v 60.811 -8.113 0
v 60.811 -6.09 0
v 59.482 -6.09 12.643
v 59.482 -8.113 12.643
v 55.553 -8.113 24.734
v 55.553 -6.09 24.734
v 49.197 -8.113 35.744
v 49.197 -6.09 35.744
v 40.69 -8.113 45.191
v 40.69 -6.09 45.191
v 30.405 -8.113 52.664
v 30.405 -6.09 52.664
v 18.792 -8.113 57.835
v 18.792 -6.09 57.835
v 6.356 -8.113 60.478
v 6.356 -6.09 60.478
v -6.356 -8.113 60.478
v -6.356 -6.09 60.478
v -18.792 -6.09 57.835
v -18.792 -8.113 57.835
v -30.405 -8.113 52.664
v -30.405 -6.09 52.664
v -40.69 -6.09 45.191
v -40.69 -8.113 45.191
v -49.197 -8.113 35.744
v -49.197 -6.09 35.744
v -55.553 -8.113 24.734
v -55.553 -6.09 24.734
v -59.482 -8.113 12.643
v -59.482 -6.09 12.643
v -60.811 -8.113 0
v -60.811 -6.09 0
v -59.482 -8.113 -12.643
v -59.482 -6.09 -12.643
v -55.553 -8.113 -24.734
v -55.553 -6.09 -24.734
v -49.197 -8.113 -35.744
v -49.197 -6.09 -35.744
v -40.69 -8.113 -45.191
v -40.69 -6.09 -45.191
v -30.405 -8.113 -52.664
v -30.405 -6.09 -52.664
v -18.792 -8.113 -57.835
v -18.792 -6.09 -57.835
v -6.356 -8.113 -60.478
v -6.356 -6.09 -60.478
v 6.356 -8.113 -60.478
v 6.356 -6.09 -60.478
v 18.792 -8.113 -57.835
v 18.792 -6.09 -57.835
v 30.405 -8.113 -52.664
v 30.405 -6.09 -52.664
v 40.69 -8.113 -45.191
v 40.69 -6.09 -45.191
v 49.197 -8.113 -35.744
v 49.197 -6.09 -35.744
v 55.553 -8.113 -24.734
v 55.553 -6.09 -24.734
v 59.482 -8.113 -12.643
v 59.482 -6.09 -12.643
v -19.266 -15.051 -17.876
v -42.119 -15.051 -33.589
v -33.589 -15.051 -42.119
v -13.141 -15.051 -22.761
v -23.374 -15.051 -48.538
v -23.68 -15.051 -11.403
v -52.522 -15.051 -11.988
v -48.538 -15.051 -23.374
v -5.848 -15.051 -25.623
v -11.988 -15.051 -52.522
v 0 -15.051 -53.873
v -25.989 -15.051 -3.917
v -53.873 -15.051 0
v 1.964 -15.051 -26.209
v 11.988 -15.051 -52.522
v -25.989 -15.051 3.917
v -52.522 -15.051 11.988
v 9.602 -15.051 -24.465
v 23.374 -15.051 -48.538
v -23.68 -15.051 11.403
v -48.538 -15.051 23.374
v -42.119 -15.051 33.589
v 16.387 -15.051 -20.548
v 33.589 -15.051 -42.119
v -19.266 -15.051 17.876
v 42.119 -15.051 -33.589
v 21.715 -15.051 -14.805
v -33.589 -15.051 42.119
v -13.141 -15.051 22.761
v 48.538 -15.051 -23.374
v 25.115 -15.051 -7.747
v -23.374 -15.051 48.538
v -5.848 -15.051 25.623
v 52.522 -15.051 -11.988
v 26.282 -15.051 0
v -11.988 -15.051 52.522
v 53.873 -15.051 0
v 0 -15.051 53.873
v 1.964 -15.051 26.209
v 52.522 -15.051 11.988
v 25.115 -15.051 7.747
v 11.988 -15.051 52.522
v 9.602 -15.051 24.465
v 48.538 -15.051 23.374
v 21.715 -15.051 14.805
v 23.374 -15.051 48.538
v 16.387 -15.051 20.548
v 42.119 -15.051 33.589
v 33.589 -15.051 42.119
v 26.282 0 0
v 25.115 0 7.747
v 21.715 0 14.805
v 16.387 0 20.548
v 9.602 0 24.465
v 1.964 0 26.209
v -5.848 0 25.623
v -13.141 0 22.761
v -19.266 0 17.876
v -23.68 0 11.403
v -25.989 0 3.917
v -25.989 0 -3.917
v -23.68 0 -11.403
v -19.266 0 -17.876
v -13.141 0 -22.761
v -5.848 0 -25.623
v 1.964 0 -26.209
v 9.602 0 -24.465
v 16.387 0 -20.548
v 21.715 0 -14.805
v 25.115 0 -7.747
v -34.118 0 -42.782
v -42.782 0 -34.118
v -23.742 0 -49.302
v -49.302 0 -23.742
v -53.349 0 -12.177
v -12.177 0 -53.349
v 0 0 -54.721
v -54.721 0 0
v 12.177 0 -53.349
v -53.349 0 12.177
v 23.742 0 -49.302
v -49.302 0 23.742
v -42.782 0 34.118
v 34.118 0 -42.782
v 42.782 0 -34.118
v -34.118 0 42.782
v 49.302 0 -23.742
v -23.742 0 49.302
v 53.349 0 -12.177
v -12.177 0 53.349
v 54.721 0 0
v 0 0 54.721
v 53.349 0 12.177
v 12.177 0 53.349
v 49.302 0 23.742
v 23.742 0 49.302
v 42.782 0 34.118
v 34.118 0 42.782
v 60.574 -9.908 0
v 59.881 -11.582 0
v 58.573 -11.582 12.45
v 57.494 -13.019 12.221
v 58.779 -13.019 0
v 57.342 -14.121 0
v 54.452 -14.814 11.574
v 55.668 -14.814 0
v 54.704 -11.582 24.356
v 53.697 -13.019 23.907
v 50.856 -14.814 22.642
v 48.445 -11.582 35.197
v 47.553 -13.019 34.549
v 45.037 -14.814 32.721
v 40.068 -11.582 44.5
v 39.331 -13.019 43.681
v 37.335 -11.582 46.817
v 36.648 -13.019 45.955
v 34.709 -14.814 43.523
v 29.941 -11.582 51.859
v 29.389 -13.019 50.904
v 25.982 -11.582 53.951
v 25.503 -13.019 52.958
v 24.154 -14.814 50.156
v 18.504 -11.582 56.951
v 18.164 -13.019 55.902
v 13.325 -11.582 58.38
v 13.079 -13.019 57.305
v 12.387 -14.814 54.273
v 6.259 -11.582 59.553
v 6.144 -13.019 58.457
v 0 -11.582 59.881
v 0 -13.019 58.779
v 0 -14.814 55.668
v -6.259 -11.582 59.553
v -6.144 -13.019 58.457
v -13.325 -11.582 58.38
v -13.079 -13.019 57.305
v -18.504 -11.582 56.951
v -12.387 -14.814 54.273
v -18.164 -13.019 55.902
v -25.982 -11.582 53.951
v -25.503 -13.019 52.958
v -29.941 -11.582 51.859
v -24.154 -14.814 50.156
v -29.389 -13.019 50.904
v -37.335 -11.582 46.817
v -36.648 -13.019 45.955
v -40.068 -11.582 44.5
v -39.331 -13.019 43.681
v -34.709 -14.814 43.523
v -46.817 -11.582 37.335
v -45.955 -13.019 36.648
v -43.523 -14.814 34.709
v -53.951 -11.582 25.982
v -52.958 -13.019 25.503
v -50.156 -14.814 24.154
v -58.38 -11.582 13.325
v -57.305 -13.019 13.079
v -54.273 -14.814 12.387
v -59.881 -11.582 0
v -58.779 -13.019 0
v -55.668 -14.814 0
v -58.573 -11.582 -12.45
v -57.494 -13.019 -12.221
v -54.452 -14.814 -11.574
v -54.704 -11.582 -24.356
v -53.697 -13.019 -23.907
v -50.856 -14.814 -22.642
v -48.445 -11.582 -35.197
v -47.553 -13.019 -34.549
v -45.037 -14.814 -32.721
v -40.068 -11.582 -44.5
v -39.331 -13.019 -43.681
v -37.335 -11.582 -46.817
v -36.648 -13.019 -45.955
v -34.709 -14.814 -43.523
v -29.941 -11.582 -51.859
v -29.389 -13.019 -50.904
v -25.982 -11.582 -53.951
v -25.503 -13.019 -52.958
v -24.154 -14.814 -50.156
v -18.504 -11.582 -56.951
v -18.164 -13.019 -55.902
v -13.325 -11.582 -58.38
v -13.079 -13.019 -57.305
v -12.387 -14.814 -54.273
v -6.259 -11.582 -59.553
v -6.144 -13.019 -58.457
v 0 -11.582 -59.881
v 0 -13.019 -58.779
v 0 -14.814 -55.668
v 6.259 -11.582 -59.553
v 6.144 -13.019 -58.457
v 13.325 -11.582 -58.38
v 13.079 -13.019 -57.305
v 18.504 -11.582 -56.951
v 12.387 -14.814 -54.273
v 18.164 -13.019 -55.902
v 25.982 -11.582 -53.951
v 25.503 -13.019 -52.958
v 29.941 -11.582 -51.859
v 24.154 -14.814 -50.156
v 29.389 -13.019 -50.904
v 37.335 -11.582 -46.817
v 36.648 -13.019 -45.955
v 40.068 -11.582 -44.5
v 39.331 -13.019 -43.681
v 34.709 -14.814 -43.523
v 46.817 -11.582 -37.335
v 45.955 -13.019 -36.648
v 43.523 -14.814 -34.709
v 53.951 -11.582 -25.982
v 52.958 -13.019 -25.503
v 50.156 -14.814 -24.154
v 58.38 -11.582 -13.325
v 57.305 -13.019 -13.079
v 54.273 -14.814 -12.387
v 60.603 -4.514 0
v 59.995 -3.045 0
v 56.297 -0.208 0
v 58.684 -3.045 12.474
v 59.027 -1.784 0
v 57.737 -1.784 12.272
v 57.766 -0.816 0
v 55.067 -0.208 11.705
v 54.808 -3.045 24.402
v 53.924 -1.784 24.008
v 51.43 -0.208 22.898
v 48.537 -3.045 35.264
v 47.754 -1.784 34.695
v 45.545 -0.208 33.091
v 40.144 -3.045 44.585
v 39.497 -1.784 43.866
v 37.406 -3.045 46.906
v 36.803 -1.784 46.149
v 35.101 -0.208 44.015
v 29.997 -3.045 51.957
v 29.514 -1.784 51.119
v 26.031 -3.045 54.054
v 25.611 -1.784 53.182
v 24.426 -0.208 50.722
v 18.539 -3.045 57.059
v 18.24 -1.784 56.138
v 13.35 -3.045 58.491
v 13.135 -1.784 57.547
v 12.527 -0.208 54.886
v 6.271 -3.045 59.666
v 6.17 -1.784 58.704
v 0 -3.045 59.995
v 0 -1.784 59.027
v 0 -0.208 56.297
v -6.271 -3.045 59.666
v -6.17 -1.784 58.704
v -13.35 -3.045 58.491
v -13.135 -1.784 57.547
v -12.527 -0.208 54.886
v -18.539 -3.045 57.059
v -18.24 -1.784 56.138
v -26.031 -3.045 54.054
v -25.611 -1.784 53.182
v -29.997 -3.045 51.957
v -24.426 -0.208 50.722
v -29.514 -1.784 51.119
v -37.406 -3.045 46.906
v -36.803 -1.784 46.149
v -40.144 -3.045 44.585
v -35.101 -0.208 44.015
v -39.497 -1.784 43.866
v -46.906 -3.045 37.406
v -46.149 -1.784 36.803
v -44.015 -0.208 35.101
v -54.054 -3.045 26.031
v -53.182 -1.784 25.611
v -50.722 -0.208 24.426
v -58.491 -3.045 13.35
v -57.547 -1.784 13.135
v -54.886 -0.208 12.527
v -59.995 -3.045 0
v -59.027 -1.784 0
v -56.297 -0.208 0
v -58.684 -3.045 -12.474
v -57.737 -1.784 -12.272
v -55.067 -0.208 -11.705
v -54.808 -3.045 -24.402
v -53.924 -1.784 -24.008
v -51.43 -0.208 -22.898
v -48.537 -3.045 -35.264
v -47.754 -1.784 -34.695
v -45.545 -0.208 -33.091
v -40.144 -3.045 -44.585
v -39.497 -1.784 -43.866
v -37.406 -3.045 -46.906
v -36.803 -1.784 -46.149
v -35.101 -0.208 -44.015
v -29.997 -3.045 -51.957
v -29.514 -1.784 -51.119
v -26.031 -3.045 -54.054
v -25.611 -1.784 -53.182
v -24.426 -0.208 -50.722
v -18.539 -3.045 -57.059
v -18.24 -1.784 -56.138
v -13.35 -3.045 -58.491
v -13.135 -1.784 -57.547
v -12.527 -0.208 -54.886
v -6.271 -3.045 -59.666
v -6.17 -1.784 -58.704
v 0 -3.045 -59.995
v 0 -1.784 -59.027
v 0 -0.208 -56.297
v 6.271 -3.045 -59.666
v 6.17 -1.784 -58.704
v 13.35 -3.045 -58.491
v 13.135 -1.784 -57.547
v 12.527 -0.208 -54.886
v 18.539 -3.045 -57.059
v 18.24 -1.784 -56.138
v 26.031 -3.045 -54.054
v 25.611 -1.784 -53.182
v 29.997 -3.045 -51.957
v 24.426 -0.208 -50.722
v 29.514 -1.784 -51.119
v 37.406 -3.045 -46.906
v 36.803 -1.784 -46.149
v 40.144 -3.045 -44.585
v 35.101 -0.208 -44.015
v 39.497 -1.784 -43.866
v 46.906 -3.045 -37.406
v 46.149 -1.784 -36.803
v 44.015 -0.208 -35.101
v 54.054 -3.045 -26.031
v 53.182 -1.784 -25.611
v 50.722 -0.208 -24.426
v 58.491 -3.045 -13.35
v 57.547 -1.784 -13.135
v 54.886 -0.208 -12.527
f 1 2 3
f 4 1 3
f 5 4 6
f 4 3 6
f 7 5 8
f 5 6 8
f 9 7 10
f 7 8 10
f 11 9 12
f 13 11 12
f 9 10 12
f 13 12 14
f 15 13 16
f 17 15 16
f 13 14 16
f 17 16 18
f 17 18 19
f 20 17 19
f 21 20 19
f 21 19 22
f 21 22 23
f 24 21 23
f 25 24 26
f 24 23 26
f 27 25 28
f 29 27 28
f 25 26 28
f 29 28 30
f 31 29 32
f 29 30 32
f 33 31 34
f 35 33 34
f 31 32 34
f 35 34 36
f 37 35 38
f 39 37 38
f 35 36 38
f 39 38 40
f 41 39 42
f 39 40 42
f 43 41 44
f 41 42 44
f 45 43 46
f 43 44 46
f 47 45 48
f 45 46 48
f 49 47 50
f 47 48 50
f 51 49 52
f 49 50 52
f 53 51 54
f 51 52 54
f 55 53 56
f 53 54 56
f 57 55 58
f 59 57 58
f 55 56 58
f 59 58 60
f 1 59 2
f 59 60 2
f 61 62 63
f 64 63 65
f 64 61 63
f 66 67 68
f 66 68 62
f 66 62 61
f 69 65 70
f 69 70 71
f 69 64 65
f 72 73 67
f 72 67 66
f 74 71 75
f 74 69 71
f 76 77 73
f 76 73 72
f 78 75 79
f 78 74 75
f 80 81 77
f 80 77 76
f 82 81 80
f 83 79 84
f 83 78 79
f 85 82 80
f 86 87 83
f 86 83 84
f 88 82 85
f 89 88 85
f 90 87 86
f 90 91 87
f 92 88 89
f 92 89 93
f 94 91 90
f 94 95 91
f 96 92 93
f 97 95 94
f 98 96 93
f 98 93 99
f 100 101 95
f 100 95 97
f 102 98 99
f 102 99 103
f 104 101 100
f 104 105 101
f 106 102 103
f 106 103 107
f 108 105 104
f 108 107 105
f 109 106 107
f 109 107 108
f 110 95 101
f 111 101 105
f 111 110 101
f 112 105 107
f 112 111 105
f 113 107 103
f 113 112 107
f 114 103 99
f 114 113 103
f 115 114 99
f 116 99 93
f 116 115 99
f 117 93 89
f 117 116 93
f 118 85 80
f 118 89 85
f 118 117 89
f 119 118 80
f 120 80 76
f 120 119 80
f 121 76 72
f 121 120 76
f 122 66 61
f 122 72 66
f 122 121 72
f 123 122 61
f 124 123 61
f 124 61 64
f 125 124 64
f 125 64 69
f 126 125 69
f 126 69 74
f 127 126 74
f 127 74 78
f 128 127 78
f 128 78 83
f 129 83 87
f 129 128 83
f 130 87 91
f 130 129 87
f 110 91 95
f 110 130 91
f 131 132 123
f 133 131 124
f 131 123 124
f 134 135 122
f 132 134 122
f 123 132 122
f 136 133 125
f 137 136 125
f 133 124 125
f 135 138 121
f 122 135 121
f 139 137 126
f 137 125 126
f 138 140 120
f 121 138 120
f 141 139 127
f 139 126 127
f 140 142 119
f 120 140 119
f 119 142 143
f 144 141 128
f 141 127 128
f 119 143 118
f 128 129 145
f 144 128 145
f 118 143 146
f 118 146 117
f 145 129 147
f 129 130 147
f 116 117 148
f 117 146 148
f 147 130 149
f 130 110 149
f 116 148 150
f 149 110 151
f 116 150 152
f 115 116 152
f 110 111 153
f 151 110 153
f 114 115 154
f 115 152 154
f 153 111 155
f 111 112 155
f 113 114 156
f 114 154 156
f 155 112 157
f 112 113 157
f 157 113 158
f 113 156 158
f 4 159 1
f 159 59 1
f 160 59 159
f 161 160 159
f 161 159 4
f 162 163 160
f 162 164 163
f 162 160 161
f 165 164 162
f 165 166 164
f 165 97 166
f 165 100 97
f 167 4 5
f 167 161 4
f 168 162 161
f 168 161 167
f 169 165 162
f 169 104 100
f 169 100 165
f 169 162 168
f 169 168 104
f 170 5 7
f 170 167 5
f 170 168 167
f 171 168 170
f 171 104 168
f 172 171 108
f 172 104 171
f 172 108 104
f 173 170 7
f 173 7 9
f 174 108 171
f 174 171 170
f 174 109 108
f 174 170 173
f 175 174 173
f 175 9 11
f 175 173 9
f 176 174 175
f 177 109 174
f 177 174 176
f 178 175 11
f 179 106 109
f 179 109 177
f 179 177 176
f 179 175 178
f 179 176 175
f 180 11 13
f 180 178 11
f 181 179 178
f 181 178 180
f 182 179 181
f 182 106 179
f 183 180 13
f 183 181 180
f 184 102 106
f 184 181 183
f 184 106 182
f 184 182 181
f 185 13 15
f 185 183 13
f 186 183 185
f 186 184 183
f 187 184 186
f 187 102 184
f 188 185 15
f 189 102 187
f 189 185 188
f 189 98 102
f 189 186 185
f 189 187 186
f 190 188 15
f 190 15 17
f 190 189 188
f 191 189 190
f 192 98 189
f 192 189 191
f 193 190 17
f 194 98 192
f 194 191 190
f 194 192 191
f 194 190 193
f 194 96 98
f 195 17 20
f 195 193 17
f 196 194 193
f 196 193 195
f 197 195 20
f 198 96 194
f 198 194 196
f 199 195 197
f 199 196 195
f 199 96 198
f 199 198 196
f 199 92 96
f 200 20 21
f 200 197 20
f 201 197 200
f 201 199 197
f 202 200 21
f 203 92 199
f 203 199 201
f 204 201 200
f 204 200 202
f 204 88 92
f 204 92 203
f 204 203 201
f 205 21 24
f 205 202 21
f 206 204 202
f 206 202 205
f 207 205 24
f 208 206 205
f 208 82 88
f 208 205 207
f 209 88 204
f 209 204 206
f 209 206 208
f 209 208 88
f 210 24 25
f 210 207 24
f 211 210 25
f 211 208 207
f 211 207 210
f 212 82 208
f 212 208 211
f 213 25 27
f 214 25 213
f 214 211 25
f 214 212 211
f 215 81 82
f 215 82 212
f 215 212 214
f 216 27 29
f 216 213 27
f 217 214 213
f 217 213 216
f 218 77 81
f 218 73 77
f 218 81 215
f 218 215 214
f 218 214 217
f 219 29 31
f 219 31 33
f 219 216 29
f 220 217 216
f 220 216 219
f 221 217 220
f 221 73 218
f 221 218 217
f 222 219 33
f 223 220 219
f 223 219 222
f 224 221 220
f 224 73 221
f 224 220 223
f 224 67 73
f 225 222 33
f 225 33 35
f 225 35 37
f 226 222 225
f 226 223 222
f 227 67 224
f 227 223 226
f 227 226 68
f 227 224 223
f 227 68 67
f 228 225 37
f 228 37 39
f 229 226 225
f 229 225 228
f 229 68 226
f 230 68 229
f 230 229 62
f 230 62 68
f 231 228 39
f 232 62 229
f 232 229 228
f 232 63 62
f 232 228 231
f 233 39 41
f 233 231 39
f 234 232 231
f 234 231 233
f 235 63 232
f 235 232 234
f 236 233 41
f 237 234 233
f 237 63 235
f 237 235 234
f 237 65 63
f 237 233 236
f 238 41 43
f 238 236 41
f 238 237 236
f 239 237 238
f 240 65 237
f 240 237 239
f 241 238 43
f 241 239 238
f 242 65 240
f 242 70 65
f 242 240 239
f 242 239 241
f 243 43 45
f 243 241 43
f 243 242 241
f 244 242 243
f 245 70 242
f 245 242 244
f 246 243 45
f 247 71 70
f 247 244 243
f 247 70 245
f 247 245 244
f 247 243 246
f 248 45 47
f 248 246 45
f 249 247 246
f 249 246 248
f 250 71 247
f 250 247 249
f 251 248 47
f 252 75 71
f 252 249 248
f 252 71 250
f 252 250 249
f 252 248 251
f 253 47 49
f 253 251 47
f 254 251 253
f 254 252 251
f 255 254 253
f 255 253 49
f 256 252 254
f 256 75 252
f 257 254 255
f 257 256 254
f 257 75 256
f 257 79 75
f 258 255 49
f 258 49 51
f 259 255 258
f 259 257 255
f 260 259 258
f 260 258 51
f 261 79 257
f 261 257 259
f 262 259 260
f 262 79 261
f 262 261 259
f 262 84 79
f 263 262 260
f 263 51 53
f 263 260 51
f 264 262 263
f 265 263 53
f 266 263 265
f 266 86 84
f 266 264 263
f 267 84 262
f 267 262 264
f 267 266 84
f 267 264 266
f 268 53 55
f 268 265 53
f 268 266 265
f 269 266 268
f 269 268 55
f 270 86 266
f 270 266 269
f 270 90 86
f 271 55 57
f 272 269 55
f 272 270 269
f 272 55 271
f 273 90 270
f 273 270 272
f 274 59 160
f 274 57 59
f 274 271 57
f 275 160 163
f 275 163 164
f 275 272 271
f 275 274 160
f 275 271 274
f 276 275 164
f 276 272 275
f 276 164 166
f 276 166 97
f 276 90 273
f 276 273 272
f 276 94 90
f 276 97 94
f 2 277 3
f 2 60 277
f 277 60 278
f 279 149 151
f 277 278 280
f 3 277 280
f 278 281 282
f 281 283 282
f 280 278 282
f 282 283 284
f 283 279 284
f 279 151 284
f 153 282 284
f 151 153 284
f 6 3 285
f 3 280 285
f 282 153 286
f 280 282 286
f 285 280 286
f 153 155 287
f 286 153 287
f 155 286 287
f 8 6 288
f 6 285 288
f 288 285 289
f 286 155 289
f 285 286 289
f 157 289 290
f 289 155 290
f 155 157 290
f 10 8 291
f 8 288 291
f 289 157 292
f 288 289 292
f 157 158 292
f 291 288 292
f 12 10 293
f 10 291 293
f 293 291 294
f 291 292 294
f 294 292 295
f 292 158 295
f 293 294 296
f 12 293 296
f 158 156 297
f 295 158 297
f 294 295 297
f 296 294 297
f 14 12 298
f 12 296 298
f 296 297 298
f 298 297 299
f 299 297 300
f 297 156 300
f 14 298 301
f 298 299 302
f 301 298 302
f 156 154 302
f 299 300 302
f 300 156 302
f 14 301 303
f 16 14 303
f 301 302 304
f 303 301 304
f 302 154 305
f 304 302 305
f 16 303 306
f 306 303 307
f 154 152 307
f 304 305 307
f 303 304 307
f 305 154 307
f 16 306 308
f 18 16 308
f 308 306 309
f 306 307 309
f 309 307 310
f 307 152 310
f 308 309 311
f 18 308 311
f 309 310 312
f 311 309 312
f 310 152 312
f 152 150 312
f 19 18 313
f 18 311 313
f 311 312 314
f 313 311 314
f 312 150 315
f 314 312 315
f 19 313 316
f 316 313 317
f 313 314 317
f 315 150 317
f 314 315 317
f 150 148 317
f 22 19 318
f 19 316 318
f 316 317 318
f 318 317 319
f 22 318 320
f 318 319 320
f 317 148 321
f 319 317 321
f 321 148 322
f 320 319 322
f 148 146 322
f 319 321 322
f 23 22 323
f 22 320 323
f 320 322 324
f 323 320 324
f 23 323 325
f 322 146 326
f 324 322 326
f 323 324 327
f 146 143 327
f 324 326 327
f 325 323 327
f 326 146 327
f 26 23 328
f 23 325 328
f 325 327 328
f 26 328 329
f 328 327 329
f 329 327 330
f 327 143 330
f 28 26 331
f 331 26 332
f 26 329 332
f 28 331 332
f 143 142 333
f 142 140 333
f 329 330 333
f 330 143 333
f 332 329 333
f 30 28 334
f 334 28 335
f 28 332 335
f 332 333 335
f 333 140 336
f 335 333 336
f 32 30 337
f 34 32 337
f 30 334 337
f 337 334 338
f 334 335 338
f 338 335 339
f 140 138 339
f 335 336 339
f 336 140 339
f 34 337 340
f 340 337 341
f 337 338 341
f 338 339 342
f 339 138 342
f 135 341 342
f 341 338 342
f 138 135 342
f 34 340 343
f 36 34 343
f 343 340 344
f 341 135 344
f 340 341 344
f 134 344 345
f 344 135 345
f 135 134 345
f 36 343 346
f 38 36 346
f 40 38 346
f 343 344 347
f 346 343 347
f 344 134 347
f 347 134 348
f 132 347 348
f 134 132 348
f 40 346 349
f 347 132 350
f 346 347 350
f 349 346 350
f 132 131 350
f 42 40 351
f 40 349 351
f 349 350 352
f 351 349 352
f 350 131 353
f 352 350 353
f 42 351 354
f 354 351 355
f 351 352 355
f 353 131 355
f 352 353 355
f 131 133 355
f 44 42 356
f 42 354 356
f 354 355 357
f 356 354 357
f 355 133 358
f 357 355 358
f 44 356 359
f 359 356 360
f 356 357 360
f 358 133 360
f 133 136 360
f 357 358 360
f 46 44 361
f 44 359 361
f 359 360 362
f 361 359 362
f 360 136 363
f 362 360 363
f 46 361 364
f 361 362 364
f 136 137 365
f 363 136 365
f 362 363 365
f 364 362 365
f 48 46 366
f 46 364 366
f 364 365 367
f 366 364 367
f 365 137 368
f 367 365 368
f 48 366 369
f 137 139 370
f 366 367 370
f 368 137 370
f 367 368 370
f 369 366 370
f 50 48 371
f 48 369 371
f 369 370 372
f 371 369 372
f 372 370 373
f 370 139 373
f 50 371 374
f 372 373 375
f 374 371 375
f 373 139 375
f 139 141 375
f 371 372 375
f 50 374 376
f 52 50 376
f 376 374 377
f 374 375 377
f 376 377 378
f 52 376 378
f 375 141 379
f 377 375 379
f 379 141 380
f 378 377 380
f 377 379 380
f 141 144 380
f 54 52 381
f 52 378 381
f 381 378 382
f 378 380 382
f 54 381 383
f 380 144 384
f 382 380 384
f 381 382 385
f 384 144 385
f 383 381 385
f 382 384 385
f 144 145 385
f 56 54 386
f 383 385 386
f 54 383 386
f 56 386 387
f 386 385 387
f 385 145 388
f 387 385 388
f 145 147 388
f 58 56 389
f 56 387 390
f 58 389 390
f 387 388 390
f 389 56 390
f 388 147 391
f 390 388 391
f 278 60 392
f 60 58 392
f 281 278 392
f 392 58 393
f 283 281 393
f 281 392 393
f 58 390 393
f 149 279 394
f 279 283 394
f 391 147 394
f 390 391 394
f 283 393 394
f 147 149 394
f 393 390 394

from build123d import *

# Parameters (mm, degrees)
F1_R     = 60.8108481728
F3_DEPTH = 15.0508303195
F4_R     = 26.2822858087
F5_DEPTH = 160.9226148576
F6_R     = 6.0899953587
F7_R     = 6.9381681598


with BuildPart() as f3:
    # F1 (on face) → F3 (new body)
    with BuildSketch(Plane.XZ):
        Circle(F1_R)
    extrude(amount=F3_DEPTH)

    # F4 (on face) → F5 (cut)
    with BuildSketch(Plane.XZ):
        Circle(F4_R)
    extrude(amount=F5_DEPTH, mode=Mode.SUBTRACT)

    # F6
    f6_edges = [f3.edges().sort_by_distance(p)[0] for p in [
        (-60.810848, 0, 0),
    ]]
    fillet(f6_edges, radius=F6_R)

    # F7
    f7_edges = [f3.edges().sort_by_distance(p)[0] for p in [
        (-60.810848, -15.05083, 0),
    ]]
    fillet(f7_edges, radius=F7_R)


solid = f3.part
